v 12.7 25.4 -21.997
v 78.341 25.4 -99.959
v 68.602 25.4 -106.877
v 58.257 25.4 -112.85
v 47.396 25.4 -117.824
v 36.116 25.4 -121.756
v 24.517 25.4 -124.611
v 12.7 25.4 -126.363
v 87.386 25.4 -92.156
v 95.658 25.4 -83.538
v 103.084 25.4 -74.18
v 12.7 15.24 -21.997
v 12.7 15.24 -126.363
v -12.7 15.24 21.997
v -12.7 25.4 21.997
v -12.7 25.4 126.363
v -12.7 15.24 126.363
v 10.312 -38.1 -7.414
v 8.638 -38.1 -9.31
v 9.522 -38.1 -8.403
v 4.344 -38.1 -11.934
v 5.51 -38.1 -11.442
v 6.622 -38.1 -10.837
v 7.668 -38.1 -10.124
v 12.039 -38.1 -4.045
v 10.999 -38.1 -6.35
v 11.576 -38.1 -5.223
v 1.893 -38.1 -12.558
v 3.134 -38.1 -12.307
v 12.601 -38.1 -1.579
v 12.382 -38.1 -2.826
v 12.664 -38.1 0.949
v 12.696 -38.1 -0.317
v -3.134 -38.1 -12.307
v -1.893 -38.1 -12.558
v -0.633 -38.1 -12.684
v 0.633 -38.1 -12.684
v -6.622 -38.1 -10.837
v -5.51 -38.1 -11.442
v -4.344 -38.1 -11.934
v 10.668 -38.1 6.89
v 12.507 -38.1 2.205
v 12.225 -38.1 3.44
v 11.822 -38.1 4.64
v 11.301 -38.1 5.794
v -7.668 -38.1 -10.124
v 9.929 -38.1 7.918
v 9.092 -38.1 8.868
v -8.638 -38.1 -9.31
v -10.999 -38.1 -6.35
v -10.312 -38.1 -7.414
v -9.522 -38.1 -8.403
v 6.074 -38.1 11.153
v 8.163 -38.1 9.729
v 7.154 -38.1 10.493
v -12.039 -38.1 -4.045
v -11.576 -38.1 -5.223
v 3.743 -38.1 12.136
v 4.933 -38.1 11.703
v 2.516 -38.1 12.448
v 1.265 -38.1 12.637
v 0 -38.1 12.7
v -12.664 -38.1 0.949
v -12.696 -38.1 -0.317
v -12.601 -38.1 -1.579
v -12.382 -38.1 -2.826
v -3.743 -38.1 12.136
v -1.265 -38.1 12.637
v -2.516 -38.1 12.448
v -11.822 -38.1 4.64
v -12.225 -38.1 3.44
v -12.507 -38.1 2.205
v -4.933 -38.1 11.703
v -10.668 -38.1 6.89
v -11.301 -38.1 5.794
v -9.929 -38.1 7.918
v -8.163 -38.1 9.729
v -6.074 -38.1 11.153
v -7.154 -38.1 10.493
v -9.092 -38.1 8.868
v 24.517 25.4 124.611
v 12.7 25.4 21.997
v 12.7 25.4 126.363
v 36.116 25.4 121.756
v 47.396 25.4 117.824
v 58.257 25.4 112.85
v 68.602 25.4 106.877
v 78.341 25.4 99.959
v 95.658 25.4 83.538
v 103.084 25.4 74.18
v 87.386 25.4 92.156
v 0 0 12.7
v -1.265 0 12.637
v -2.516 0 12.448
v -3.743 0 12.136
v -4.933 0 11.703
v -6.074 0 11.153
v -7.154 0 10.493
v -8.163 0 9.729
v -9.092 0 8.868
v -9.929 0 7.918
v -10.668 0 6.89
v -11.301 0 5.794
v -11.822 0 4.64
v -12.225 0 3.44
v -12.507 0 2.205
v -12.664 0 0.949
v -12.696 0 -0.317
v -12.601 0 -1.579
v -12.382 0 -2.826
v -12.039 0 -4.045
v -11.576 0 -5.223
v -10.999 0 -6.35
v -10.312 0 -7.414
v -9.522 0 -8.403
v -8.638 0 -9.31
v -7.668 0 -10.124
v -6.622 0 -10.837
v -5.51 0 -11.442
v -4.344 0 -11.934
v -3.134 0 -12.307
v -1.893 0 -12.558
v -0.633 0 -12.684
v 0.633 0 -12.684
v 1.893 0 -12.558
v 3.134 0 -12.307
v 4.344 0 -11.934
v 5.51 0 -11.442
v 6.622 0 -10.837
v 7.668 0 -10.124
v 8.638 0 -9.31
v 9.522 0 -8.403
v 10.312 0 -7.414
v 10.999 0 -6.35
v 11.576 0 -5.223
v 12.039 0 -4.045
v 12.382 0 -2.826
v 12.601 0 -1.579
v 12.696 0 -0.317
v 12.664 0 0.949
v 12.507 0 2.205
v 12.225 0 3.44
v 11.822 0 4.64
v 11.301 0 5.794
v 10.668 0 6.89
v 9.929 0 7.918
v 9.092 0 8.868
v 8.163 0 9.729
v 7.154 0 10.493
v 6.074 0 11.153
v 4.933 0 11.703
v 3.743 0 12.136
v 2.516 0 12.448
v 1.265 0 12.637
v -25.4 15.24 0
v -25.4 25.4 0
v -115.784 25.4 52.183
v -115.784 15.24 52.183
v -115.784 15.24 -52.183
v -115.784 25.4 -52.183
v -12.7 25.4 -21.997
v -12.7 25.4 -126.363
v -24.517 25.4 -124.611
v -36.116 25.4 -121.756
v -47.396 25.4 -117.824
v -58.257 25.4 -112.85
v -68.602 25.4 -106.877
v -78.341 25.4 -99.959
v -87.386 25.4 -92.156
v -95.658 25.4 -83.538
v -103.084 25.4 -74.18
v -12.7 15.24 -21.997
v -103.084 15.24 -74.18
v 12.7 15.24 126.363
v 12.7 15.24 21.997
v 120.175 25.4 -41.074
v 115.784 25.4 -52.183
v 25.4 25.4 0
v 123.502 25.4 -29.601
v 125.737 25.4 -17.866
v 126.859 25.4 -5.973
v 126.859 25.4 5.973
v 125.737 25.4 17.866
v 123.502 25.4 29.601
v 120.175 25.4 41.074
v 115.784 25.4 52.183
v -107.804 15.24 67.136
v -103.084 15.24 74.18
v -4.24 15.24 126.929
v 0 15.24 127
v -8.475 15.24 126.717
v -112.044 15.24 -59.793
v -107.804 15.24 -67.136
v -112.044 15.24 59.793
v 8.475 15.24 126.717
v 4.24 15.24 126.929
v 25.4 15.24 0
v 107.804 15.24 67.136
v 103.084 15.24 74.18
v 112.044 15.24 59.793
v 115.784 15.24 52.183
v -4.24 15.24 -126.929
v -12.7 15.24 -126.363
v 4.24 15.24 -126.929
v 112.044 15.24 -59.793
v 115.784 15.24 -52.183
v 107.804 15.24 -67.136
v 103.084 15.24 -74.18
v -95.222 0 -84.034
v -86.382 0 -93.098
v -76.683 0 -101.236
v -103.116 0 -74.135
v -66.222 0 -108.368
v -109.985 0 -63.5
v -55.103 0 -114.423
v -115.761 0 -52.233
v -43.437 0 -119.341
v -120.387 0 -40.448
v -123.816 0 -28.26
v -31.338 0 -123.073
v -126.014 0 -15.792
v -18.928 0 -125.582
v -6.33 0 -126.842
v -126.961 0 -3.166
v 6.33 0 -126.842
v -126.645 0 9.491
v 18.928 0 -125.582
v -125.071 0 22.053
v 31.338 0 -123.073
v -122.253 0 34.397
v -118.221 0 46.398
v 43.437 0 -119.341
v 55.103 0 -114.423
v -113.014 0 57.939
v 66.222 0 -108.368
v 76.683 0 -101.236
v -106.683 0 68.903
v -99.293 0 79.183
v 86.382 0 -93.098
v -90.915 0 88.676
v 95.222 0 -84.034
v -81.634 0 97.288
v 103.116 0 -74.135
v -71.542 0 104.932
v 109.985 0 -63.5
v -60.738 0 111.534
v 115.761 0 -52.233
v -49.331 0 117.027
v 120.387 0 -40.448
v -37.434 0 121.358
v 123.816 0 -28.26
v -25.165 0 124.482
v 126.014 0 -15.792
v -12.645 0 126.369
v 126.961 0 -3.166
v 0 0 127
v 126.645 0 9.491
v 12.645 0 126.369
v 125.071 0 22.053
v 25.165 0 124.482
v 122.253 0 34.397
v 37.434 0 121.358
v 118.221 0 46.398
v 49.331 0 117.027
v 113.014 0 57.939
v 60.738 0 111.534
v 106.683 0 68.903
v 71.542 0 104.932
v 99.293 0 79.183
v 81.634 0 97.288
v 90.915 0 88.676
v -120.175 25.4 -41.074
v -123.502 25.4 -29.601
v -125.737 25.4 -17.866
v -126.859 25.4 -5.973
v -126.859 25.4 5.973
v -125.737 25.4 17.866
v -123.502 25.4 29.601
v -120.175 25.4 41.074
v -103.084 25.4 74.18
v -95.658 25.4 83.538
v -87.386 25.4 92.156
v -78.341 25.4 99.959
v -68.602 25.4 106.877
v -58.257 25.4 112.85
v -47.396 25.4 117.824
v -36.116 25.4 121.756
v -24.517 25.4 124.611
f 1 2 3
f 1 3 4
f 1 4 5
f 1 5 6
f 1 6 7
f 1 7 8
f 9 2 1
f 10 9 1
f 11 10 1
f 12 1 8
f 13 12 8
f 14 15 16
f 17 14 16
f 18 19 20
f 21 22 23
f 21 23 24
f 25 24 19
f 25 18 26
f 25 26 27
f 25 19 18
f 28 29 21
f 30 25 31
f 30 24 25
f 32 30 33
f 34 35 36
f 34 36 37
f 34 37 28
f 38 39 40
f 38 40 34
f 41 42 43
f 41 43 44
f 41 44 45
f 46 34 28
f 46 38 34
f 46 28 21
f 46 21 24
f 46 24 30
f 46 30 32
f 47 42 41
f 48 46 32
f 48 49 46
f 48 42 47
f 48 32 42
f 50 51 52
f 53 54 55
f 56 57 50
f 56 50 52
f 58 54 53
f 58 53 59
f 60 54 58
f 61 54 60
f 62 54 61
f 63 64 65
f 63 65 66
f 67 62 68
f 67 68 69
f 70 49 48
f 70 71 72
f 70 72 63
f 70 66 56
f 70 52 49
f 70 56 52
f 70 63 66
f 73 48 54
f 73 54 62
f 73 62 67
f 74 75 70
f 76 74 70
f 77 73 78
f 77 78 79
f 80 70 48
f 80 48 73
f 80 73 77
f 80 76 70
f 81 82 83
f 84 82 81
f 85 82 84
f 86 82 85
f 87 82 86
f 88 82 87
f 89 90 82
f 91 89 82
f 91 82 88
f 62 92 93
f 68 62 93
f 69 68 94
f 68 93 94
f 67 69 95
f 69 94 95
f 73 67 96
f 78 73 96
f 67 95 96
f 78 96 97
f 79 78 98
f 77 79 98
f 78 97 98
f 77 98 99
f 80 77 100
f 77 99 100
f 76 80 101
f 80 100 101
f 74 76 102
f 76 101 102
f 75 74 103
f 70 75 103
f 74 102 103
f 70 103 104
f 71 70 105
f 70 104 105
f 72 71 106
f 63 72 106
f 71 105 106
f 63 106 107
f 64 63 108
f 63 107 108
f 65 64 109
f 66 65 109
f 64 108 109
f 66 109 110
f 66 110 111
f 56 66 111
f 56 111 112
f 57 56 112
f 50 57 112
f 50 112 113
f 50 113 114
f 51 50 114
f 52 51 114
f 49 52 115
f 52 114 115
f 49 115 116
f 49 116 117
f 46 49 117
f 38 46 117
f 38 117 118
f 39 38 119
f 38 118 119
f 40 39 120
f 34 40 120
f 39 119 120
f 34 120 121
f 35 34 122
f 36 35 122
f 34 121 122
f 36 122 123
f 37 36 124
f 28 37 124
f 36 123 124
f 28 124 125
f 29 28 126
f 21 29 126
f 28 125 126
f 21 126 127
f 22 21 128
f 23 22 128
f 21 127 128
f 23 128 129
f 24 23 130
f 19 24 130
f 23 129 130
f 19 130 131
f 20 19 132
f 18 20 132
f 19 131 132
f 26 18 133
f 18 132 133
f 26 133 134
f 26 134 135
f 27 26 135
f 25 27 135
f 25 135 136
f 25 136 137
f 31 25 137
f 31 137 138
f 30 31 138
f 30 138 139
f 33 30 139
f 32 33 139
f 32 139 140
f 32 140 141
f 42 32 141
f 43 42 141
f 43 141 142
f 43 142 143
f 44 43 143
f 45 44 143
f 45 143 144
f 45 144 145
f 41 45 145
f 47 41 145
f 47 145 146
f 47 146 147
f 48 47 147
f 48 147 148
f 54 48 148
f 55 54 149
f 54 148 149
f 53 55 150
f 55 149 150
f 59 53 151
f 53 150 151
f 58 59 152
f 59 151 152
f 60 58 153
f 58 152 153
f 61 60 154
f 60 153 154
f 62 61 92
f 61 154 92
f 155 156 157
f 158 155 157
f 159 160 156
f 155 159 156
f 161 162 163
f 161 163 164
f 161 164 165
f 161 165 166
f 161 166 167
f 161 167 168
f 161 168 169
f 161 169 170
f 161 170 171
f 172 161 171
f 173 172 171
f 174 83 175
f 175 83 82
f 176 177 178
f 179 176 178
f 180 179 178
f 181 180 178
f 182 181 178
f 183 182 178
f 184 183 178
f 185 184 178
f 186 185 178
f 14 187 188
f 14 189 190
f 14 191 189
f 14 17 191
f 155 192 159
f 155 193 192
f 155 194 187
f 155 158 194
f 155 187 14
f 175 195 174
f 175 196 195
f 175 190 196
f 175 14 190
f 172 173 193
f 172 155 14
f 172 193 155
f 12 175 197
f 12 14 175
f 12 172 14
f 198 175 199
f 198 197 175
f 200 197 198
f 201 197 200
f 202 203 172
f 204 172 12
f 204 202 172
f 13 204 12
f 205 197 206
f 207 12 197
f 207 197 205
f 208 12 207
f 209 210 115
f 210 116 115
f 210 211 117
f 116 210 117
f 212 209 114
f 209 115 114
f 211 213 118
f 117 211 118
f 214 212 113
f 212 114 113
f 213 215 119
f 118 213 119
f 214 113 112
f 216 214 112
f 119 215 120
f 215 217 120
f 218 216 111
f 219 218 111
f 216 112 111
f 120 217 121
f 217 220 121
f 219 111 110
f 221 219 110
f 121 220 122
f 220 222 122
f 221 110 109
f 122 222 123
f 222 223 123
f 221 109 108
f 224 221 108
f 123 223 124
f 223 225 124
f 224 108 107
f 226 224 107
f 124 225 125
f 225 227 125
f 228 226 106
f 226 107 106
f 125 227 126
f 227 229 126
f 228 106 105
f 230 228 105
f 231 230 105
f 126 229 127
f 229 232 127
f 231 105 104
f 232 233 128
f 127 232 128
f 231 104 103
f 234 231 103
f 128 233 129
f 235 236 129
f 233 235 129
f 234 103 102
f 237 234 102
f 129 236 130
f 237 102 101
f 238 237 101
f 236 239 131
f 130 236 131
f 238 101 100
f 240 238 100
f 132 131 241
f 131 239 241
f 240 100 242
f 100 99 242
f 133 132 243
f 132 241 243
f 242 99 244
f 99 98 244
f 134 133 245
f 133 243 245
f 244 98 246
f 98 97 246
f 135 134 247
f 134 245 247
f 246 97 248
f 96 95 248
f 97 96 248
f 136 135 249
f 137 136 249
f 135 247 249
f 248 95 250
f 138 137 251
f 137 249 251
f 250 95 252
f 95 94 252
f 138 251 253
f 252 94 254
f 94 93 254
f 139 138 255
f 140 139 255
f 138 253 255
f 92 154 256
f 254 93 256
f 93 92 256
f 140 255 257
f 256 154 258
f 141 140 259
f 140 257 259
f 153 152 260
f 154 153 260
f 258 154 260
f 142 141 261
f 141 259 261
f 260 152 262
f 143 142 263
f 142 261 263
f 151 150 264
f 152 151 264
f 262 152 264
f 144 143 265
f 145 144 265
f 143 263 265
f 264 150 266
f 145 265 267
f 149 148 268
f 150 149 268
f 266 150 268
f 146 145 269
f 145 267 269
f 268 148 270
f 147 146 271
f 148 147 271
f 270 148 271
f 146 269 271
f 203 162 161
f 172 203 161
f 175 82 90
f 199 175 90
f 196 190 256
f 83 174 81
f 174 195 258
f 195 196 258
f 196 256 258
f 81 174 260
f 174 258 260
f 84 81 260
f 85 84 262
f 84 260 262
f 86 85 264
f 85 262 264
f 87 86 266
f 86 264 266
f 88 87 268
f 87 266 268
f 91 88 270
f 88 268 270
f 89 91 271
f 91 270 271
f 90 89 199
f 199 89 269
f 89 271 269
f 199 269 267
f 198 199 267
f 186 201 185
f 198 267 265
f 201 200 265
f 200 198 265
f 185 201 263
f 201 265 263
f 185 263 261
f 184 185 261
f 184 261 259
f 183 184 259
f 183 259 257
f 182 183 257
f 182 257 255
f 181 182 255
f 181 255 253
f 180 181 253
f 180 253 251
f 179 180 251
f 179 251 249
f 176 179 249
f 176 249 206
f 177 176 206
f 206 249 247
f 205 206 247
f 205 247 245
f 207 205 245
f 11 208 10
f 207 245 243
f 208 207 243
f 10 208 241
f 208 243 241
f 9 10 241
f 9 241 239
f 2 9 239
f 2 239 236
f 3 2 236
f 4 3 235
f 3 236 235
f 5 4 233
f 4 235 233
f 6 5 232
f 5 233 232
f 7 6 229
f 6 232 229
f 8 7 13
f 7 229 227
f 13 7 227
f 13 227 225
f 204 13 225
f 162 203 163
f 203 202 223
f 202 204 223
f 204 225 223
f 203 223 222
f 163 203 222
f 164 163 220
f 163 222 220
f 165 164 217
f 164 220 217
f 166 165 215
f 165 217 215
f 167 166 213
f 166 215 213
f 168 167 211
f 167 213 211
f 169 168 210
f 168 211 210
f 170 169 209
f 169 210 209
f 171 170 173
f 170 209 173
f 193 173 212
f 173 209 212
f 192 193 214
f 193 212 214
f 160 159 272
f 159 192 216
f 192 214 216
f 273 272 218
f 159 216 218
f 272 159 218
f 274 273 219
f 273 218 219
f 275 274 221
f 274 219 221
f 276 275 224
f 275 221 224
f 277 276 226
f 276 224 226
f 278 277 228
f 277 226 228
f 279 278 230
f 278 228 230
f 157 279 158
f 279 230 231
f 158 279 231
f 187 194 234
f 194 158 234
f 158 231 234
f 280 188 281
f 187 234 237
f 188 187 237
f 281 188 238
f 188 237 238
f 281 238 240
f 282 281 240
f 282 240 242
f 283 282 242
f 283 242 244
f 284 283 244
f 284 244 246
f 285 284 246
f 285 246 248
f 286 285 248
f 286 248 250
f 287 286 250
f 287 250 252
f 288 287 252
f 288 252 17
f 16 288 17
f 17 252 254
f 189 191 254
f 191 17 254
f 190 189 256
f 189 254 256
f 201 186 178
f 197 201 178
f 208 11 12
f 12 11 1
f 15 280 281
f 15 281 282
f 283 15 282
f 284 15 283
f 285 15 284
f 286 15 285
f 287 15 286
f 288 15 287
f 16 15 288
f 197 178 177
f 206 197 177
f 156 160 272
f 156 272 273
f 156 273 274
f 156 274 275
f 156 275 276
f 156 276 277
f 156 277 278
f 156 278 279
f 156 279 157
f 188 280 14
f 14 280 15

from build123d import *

# Parameters (mm, degrees)
SKETCH1_R           = 127
BOSS_EXTRUDE1_DEPTH = 25.4
CUT_EXTRUDE1_DEPTH  = 10.16
SKETCH3_R           = 12.7
BOSS_EXTRUDE2_DEPTH = 38.1


with BuildPart() as part:
    # Sketch1 → Boss-Extrude1 (new body)
    with BuildSketch(Plane(origin=(0, 0, 0), x_dir=(1, 0, 0), z_dir=(0, 1, 0))):
        with Locations(Location((0, 0, 0), (0, 0, 270))):
            Circle(SKETCH1_R)
    extrude(amount=BOSS_EXTRUDE1_DEPTH)

    # Sketch2 → Cut-Extrude1 (cut)
    with BuildSketch(Plane(origin=(0, 25.4, 0), x_dir=(1, 0, 0), z_dir=(0, 1, 0))):
        Polygon((12.7, -127), (12.7, -21.997045256), (103.635226281, -74.498522628), (138.332271537, -74.498522628), (116.335226281, -52.501477372), (25.4, 0), (116.335226281, 52.501477372), (130.311019476, 77.4940315), (103.635226281, 74.498522628), (12.7, 21.997045256), (12.7, 127), (0, 157.984531472), (-12.7, 127), (-12.7, 21.997045256), (-103.635226281, 74.498522628), (-124.892355956, 78.379341128), (-116.335226281, 52.501477372), (-25.4, 0), (-116.335226281, -52.501477372), (-133.449485631, -77.846459753), (-103.635226281, -74.498522628), (-12.7, -21.997045256), (-12.7, -127), (12.7, -156.136703653), align=None)
    extrude(amount=-CUT_EXTRUDE1_DEPTH, mode=Mode.SUBTRACT)

    # Sketch3 → Boss-Extrude2 (add)
    with BuildSketch(Plane(origin=(0, 0, 0), x_dir=(-1, 0, 0), z_dir=(0, -1, 0))):
        with Locations(Location((0, 0, 0), (0, 0, 270))):
            Circle(SKETCH3_R)
    extrude(amount=BOSS_EXTRUDE2_DEPTH)


solid = part.part
